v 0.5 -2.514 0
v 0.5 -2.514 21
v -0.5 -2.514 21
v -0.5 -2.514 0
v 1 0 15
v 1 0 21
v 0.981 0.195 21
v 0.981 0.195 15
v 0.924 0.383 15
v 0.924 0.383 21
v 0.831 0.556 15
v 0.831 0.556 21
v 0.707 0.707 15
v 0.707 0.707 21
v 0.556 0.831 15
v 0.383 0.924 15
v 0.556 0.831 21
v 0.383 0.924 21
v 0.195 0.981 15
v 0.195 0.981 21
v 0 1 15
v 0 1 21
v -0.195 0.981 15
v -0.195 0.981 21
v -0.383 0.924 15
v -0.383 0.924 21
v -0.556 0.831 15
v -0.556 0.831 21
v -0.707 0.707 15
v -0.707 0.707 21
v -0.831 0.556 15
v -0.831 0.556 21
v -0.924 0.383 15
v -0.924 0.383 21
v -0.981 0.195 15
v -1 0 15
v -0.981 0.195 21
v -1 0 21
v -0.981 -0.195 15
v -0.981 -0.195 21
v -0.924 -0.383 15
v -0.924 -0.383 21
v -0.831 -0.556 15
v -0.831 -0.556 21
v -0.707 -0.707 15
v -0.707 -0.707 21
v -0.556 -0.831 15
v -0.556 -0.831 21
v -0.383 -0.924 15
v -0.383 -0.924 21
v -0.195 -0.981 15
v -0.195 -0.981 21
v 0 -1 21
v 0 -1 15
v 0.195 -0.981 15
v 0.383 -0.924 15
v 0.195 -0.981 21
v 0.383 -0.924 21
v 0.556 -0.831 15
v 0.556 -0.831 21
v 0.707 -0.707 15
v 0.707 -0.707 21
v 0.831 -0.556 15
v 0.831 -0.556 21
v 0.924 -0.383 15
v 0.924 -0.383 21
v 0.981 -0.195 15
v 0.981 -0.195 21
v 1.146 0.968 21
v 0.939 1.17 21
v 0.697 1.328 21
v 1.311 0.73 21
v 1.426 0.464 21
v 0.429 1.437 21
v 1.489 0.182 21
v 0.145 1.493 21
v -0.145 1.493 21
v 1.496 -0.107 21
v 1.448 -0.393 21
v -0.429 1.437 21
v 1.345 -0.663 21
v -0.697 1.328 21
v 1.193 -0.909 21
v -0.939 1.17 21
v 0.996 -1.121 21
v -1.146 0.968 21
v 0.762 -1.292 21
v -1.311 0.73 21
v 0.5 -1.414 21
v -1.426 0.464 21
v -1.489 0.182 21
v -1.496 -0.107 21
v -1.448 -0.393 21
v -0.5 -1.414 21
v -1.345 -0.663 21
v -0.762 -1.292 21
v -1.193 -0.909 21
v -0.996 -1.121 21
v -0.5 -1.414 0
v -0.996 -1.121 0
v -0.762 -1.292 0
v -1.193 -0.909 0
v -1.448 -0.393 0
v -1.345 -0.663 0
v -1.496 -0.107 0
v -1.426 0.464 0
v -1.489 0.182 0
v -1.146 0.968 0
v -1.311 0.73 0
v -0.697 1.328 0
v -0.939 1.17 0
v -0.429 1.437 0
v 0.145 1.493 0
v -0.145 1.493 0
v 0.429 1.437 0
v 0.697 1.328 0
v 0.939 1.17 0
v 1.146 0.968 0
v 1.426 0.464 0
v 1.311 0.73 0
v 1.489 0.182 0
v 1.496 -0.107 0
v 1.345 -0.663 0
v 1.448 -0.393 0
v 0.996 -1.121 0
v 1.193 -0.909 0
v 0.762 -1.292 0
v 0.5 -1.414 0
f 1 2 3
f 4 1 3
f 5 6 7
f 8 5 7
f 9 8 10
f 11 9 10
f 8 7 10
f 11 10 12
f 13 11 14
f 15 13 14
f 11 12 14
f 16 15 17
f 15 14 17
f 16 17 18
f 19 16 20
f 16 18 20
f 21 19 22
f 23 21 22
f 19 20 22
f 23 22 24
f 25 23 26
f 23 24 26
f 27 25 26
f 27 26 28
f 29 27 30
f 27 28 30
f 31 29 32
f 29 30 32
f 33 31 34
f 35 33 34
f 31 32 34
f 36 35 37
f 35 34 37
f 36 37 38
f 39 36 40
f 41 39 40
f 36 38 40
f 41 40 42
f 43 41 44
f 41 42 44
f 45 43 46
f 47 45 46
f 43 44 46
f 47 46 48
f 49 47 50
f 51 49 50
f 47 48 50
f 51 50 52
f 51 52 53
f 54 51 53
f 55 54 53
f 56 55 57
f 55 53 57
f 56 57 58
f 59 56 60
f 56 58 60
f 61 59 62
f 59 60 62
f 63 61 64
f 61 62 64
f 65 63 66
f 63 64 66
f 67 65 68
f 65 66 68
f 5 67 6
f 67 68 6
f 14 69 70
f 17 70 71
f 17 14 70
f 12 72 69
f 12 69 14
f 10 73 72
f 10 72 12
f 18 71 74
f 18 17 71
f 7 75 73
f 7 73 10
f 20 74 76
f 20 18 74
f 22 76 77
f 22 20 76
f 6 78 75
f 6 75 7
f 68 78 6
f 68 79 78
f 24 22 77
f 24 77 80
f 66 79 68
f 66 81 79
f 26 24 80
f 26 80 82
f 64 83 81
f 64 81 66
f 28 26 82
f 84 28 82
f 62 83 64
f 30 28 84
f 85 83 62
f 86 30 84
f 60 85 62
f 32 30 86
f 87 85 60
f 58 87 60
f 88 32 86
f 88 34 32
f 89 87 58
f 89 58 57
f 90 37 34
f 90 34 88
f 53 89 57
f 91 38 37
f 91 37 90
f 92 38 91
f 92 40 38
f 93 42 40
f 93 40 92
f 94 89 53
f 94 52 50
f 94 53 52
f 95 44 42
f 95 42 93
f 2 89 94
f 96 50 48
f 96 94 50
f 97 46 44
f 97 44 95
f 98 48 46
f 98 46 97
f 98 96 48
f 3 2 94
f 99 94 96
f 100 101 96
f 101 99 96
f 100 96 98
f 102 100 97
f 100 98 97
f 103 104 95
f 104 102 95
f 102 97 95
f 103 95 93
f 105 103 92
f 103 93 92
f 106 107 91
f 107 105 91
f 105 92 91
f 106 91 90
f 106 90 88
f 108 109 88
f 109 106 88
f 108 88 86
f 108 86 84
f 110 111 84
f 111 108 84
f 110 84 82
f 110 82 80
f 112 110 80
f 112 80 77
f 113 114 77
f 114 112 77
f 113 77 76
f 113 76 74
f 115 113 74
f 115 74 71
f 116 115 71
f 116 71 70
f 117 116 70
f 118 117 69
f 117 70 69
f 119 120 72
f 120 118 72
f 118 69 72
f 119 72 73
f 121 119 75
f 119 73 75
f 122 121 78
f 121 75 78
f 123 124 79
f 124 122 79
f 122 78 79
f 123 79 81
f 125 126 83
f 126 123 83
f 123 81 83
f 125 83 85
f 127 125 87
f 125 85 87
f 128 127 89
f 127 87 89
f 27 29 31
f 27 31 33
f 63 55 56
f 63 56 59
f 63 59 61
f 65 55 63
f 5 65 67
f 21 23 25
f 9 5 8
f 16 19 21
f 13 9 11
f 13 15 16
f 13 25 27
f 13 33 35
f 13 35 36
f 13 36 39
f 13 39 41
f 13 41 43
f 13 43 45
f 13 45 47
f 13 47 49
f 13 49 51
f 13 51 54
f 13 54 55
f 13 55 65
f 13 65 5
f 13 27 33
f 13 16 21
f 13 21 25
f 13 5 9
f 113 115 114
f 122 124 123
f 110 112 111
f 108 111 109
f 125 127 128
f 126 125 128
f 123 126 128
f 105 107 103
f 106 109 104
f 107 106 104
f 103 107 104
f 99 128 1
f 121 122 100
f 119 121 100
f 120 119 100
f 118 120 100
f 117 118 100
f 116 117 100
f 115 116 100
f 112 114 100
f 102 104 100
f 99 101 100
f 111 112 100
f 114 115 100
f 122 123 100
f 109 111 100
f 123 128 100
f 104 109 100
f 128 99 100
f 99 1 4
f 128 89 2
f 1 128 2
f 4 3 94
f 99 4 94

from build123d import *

# Parameters (mm, degrees)
SKETCH1_R               = 5
BOSS_EXTRUDE1_DEPTH     = 21
CUT_EXTRUDE1_DEPTH      = 23.158519806
CUT_EXTRUDE1_DEPTH_BACK = 23.158519806
SKETCH2_OUTSIDE_W       = 17.064
SKETCH2_OUTSIDE_H       = 17.064
SKETCH6_R               = 1
CUT_EXTRUDE4_DEPTH      = 6


with BuildPart() as part:
    # Sketch1 → Boss-Extrude1 (new body)
    with BuildSketch(Plane.XY):
        with Locations(Location((0, 0, 0), (0, 0, 180))):
            Circle(SKETCH1_R)
    extrude(amount=BOSS_EXTRUDE1_DEPTH)

    # Sketch2 outside → Cut-Extrude1 (cut, two sides: drawn at the far end of the back side and taken through both)
    with BuildSketch(Plane(origin=(0, 0, 0), x_dir=(-1, 0, 0), z_dir=(0, 0, -1)).offset(-CUT_EXTRUDE1_DEPTH_BACK)):
        Rectangle(SKETCH2_OUTSIDE_W, SKETCH2_OUTSIDE_H)
        with BuildLine():
            Line((-0.5, -1.414213562), (-0.5, -2.514213562))
            Line((-0.5, -2.514213562), (0.5, -2.514213562))
            Line((0.5, -2.514213562), (0.5, -1.414213562))
            ThreePointArc((0.5, -1.414213562), (0, 1.5), (-0.5, -1.414213562))
        make_face(mode=Mode.SUBTRACT)
    extrude(amount=CUT_EXTRUDE1_DEPTH + CUT_EXTRUDE1_DEPTH_BACK, mode=Mode.SUBTRACT)

    # Sketch6 → Cut-Extrude4 (cut)
    with BuildSketch(Plane.XY.offset(21)):
        Circle(SKETCH6_R)
    extrude(amount=-CUT_EXTRUDE4_DEPTH, mode=Mode.SUBTRACT)


solid = part.part
